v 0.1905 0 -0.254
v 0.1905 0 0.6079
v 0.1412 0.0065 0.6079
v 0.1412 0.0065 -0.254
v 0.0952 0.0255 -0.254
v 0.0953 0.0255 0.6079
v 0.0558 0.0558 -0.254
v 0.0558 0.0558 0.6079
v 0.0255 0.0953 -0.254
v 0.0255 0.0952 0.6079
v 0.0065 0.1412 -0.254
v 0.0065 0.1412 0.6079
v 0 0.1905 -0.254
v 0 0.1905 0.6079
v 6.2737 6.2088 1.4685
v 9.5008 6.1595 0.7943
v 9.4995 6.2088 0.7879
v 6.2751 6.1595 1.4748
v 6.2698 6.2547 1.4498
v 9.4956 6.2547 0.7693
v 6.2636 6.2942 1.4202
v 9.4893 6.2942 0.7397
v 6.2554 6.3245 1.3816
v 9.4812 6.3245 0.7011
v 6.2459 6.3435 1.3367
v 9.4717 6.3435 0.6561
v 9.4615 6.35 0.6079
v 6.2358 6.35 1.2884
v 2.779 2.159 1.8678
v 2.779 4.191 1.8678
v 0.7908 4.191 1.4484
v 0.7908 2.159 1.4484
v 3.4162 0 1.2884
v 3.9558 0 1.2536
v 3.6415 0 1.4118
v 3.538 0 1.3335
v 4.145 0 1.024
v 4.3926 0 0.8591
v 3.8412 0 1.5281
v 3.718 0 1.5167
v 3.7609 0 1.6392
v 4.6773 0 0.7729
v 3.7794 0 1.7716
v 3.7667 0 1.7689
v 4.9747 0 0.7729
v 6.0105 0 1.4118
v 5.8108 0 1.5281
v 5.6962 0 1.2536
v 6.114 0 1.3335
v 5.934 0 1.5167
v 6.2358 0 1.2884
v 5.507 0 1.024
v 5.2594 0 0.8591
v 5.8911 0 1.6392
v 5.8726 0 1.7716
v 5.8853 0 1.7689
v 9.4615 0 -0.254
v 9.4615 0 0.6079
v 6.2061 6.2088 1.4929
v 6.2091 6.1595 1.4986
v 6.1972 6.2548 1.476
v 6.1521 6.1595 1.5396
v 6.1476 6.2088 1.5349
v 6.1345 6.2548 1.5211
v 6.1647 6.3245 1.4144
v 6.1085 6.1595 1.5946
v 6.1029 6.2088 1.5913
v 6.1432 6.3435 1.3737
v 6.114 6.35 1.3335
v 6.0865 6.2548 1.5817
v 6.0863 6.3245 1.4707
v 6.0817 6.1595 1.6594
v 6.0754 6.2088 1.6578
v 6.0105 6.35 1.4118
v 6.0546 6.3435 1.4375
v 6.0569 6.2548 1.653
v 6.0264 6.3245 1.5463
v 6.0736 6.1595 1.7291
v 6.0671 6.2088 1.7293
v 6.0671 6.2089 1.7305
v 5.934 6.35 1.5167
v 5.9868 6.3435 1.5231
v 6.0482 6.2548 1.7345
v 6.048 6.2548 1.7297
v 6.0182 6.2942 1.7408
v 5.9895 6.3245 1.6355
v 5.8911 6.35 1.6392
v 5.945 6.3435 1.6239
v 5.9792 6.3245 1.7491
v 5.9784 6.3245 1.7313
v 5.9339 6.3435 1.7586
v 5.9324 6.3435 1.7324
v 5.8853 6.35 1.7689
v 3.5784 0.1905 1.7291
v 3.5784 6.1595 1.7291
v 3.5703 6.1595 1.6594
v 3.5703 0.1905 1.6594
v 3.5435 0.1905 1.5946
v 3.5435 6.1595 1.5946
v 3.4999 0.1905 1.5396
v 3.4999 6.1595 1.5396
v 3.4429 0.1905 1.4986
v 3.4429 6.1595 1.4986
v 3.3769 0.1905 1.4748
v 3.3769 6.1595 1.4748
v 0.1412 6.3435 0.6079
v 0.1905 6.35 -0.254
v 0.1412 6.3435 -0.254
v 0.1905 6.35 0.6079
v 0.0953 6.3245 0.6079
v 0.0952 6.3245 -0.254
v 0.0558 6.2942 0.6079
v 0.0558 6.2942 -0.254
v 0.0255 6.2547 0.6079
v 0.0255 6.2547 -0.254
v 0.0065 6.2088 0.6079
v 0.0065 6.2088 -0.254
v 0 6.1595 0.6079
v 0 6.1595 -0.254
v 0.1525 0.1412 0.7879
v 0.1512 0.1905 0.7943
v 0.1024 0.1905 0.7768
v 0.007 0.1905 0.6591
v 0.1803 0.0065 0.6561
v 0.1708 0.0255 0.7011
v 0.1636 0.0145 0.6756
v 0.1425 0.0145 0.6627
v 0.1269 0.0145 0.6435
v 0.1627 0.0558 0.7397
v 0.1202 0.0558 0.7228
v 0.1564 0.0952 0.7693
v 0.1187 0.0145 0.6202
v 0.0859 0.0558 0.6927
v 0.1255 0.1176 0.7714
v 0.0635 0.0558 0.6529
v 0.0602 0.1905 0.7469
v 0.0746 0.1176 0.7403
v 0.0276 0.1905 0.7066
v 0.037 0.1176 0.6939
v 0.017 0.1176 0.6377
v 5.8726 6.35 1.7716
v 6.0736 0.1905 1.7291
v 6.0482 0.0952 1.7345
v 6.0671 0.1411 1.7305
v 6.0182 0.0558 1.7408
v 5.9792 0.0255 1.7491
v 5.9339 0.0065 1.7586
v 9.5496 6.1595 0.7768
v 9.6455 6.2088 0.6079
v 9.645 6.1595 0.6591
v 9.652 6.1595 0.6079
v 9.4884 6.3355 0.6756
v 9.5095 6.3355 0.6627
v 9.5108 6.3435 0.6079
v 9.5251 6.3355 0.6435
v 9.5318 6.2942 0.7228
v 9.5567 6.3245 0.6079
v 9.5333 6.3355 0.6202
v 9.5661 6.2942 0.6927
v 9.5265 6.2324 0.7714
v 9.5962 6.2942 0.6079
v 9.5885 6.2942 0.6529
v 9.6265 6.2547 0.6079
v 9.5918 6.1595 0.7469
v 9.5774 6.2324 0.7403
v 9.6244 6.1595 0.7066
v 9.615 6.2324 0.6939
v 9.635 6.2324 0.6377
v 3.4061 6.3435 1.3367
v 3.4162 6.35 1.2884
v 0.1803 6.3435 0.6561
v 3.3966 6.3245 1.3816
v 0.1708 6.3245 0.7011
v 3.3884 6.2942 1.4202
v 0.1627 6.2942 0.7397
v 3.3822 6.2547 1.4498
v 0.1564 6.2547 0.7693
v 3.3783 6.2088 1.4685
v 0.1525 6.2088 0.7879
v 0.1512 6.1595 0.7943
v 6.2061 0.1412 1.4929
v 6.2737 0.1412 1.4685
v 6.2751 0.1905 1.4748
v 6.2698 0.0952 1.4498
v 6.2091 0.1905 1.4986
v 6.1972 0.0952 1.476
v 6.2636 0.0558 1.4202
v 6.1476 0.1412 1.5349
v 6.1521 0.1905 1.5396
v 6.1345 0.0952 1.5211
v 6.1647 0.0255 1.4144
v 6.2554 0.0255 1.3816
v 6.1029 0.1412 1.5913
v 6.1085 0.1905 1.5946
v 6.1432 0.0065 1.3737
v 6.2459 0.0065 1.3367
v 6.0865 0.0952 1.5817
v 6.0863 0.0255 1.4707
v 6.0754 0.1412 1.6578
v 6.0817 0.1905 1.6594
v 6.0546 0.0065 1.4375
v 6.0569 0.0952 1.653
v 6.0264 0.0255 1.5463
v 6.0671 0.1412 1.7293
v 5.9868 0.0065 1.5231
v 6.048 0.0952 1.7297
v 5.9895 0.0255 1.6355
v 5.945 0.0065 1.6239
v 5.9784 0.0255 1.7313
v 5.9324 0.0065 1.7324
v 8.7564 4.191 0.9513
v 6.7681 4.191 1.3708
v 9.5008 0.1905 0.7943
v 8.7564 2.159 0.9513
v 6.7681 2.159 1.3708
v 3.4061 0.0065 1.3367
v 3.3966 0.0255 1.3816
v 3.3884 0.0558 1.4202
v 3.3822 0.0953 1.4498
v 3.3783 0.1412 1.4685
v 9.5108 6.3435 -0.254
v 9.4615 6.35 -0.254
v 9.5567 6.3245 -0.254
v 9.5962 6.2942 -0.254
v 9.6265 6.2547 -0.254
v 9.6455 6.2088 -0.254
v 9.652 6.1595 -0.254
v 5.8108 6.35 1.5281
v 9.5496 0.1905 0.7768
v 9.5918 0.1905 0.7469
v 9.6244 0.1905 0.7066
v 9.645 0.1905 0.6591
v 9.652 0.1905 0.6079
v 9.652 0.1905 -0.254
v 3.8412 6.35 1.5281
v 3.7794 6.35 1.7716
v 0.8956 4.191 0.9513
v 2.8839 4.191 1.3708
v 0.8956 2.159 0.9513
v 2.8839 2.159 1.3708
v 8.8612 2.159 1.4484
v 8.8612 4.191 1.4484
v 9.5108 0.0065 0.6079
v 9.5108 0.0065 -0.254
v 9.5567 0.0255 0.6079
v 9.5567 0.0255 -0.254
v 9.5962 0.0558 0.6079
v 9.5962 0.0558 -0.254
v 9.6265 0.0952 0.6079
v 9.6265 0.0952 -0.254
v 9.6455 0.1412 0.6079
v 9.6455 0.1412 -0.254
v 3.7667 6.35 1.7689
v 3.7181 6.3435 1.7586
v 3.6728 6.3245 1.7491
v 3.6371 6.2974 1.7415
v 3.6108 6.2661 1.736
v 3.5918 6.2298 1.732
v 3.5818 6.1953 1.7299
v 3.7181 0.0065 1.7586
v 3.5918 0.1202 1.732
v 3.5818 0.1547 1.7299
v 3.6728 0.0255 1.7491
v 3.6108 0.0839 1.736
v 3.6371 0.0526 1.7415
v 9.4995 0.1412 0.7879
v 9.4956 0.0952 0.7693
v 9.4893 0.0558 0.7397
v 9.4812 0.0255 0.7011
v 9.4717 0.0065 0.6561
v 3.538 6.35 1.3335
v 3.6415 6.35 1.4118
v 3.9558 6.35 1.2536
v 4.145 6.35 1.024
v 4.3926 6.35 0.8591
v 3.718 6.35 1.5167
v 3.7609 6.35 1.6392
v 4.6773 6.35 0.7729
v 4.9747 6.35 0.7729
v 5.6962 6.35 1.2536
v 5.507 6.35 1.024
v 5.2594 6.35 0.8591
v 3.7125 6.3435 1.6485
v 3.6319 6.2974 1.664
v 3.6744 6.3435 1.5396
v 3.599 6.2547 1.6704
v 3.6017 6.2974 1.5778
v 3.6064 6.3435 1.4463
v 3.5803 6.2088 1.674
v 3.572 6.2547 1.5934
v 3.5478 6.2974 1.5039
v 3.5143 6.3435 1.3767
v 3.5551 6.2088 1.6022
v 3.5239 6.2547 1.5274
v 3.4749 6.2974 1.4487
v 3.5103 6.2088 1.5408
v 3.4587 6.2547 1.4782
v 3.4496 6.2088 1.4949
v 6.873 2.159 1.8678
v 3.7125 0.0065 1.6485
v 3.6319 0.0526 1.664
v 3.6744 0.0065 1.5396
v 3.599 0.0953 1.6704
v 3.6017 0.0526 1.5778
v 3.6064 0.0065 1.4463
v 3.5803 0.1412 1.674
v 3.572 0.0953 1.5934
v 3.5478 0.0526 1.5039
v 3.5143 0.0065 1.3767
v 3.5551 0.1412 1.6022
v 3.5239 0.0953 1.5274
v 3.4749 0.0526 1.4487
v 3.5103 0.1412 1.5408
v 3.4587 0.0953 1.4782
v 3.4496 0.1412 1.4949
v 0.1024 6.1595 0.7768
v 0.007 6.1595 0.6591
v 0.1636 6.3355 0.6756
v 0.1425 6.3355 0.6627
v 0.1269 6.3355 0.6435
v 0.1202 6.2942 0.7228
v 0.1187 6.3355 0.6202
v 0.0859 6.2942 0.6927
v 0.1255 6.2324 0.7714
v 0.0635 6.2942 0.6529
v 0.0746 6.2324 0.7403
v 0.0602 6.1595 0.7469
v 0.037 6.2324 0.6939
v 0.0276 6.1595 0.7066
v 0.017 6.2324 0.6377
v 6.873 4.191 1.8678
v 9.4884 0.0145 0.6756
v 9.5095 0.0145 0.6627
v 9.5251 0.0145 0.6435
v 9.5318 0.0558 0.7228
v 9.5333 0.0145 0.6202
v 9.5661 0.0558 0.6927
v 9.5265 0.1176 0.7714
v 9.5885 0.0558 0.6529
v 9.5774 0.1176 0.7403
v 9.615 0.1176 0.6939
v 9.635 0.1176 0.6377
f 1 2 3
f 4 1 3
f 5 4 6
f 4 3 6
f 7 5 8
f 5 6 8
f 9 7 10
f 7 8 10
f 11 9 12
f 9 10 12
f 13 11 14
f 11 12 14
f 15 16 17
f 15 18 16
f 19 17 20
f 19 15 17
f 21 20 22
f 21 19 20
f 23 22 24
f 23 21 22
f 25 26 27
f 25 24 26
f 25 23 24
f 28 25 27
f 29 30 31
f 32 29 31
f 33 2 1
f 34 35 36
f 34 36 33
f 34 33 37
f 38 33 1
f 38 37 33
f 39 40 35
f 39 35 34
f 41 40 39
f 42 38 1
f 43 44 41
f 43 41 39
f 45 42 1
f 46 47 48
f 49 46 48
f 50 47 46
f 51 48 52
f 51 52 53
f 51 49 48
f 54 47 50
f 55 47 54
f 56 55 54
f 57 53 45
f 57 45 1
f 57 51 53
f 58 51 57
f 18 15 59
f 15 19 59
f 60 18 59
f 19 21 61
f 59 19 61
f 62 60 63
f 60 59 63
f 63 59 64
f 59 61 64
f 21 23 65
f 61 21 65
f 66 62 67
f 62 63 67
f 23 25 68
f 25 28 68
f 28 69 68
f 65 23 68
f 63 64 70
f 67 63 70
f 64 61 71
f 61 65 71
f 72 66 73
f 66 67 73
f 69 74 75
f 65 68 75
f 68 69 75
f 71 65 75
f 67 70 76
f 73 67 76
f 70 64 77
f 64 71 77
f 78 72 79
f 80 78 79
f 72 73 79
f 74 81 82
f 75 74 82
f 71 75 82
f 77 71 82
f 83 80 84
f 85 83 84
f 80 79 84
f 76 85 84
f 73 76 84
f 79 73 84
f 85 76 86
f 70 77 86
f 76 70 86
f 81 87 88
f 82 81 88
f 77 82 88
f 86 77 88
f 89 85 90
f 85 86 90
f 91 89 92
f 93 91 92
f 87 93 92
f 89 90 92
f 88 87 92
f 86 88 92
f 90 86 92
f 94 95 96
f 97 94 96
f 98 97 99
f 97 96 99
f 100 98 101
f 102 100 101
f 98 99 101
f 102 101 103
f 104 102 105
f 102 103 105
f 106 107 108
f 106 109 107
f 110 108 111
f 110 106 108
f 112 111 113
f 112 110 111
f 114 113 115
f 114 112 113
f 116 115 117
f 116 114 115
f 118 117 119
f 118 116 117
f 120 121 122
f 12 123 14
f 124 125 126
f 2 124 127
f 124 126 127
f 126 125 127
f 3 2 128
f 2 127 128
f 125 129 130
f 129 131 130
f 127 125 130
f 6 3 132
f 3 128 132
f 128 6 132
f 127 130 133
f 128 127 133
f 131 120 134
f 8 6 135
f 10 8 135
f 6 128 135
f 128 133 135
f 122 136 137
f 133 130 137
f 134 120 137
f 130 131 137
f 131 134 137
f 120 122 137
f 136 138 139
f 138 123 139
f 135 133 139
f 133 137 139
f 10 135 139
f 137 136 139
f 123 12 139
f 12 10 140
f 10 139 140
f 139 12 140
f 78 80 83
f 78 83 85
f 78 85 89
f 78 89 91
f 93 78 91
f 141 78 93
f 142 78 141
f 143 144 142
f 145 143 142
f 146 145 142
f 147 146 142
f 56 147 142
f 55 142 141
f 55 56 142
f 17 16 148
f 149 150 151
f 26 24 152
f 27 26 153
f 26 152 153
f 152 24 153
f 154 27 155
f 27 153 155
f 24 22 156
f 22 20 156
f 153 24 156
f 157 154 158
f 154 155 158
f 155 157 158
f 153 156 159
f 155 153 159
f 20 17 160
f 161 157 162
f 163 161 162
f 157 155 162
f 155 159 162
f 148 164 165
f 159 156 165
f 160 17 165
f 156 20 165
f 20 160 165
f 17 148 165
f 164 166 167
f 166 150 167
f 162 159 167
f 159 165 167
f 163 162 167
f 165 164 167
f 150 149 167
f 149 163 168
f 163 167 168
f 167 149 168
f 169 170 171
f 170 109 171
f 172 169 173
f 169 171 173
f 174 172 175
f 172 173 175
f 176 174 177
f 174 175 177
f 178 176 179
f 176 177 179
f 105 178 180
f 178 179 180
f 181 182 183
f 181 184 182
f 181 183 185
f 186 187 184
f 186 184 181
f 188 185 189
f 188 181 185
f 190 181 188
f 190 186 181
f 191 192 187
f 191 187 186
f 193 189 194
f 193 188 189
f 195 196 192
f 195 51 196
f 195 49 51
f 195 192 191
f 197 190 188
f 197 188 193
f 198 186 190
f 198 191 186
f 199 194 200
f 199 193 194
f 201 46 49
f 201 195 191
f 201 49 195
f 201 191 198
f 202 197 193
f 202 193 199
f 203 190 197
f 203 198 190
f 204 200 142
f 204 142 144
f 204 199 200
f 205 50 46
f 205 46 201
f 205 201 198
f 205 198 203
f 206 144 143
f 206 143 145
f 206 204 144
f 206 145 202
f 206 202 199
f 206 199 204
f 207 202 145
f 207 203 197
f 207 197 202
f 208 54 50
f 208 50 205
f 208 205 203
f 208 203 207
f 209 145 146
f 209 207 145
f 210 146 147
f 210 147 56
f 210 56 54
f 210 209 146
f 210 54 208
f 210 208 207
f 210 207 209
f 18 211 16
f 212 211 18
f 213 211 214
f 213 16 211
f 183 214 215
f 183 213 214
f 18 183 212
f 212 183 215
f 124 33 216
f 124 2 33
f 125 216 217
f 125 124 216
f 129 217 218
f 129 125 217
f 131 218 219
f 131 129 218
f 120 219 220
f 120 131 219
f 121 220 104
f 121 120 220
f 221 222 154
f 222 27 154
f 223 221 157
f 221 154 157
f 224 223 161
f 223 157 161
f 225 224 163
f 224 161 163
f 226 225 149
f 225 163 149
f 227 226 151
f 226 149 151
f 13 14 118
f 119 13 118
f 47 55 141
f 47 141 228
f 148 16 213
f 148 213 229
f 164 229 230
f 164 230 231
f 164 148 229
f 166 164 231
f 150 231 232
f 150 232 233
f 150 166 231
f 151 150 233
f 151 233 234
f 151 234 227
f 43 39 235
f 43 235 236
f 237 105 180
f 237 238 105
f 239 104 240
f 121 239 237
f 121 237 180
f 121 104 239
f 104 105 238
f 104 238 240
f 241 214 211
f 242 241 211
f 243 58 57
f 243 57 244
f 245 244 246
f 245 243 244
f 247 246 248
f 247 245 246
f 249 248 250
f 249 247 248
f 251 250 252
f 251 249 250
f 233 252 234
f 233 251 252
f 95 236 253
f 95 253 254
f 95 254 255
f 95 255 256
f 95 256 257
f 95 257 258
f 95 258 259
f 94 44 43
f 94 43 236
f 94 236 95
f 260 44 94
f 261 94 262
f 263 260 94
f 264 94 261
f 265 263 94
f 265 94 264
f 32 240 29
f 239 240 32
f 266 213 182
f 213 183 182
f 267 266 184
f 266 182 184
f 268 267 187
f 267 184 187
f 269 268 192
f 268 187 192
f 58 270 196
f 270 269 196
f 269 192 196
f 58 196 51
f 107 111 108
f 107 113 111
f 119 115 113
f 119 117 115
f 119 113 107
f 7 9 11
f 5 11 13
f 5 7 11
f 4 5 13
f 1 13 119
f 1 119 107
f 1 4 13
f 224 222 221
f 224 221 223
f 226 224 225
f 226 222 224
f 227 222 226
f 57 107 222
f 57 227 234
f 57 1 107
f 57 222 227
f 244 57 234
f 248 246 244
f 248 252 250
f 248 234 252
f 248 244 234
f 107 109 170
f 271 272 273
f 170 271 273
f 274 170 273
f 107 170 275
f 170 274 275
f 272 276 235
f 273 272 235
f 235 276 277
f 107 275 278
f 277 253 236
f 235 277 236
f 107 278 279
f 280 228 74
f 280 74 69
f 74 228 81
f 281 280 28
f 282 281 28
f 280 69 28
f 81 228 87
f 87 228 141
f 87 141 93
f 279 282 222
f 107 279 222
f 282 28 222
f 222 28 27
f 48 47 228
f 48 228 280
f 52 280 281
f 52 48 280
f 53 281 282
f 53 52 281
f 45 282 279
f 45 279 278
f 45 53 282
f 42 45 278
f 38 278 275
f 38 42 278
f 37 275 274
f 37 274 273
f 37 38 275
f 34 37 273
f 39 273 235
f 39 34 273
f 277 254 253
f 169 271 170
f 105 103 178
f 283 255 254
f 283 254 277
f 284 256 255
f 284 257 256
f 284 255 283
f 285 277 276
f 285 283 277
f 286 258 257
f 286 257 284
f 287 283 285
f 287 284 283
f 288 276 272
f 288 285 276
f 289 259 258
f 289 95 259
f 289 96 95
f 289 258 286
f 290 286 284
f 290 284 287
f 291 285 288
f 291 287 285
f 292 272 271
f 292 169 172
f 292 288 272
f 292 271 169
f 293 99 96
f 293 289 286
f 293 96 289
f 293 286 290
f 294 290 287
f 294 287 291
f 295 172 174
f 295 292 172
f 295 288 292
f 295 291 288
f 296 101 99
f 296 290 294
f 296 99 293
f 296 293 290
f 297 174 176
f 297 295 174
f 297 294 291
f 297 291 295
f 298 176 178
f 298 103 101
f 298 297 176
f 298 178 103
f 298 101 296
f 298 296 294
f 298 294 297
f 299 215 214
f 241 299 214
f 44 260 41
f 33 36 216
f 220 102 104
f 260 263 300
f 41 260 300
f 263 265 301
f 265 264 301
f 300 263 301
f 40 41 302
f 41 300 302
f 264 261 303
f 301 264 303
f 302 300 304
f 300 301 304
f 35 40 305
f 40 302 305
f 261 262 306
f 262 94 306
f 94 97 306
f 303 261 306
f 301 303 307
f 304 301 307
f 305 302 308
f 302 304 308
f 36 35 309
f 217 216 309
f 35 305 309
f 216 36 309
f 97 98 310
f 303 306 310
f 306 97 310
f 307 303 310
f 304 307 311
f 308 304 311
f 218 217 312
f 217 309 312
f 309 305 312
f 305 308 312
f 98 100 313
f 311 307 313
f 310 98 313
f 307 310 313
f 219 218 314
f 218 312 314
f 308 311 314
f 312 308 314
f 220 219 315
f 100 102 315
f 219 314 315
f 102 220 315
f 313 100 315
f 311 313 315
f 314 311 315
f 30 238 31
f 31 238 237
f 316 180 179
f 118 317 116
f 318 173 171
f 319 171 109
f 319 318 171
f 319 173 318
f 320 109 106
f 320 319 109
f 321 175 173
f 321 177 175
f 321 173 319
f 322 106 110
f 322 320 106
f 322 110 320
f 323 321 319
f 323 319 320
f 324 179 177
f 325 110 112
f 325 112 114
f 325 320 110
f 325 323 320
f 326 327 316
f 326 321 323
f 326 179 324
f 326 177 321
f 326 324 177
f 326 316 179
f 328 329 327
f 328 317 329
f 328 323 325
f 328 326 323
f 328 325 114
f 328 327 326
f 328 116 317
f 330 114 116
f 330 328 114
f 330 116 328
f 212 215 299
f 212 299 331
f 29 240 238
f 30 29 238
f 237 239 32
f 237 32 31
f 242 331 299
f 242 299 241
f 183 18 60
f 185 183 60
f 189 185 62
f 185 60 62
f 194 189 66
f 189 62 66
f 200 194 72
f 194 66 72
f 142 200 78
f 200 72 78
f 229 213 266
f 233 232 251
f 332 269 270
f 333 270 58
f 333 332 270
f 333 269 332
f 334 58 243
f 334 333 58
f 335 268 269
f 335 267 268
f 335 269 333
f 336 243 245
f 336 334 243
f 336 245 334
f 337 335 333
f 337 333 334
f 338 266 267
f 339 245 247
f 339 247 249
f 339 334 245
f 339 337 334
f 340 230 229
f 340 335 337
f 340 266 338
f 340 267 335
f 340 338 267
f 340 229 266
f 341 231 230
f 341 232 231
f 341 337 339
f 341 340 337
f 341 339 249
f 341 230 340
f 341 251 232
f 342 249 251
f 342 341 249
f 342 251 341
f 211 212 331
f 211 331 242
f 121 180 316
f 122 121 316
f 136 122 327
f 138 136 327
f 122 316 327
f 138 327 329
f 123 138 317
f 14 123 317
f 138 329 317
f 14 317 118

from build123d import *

# Parameters (mm, degrees)
F1_DEPTH    = 6.35
F4_T1_DEPTH = 6.35
F2_W        = 2.032
F2_H        = 2.032
F5_DEPTH    = 0.508
F7_R        = 0.1905
F12_DEPTH   = 0.254


# Not quite as in the source:
# - a fillet or chamfer that OpenCascade refuses, or shapes differently, is made with other operations: its cross-section is extruded or revolved along the edge and cut away or added


with BuildPart() as f1:
    # F0 (on Front) → F1 (new body)
    with BuildSketch(Plane.XZ):
        with BuildLine():
            Line((0, 0.7623671392), (0, 0))
            Line((0, 0), (9.652, 0))
            Line((9.652, 0), (9.652, 0.7623671392))
            Line((9.652, 0.7623671392), (6.0225553446, 1.5280881198))
            Line((6.0225553446, 1.5280881198), (6.0735776823, 1.729142969))
            Line((6.0735776823, 1.729142969), (5.8725685775, 1.7715508037))
            Line((5.8725685775, 1.7715508037), (5.8107842668, 1.5280881198))
            ThreePointArc((5.8107842668, 1.5280881198), (4.826, 0.762), (3.8412157332, 1.5280881198))
            Line((3.8412157332, 1.5280881198), (3.7794314225, 1.7715508037))
            Line((3.7794314225, 1.7715508037), (3.5784223177, 1.729142969))
            Line((3.5784223177, 1.729142969), (3.6294446554, 1.5280881198))
            Line((3.6294446554, 1.5280881198), (0, 0.7623671392))
        make_face()
    extrude(amount=-F1_DEPTH)

    # F4: fillet of radius 0.254 on 2 edges, made by hand

    # F4_s2 → F4_t1 (join)
    with BuildSketch(Plane.XZ.offset(-6.35)):
        with BuildLine():
            ThreePointArc((6.2750780534, 1.4748122183), (6.1284229129, 1.5656081597), (6.0735776823, 1.729142969))
            Line((6.0735776823, 1.729142969), (6.0225553446, 1.5280881198))
            Line((6.0225553446, 1.5280881198), (6.2750780534, 1.4748122183))
        make_face()
        with BuildLine():
            ThreePointArc((3.5784223177, 1.729142969), (3.5235770871, 1.5656081597), (3.3769219466, 1.4748122183))
            Line((3.3769219466, 1.4748122183), (3.6294446554, 1.5280881198))
            Line((3.6294446554, 1.5280881198), (3.5784223177, 1.729142969))
        make_face()
    extrude(amount=F4_T1_DEPTH)

    # F2 (on face) → F5 (join)
    with BuildSketch(Plane(origin=(0.5652924546, 0, 2.6794324958), x_dir=(0.9784612522, 0, -0.2064305646), z_dir=(0.2064305646, 0, 0.9784612522))):
        with Locations((7.3553929503, 3.175)):
            Rectangle(F2_W, F2_H)
    f5 = extrude(amount=F5_DEPTH)

    # F6: F5 across plane
    add(f5.mirror(Plane.YZ.offset(4.826)))

    # F7
    f7_edges = [f1.edges().sort_by_distance(p)[0] for p in [
        (9.652, 3.175, 0.762367),
        (0, 3.175, 0.762367),
        (7.963539, 6.35, 1.11859),
        (7.963539, 0, 1.11859),
        (1.688461, 0, 1.11859),
        (1.688461, 6.35, 1.11859),
        (9.652, 0, 0.381184),
        (9.652, 6.35, 0.381184),
        (0, 0, 0.381184),
        (0, 6.35, 0.381184),
        (3.523577, 6.35, 1.565608),
        (3.523577, 0, 1.565608),
        (6.128423, 0, 1.565608),
        (6.128423, 6.35, 1.565608),
    ]]
    fillet(f7_edges, radius=F7_R)


with BuildPart() as f8_1:
    # F8: copy of F1
    add(f1.part)


with BuildPart() as f9_1:
    # F9: copy of F8_1
    add(f8_1.part)


with BuildPart() as f1_1:
    add(f1.part)

    # F12 (add): a face of the model
    f12_faces = [f1_1.faces().sort_by_distance(p)[0] for p in [
        (4.826, 3.175, 0),
    ]]
    extrude(f12_faces, amount=F12_DEPTH)


solid = f1_1.part
